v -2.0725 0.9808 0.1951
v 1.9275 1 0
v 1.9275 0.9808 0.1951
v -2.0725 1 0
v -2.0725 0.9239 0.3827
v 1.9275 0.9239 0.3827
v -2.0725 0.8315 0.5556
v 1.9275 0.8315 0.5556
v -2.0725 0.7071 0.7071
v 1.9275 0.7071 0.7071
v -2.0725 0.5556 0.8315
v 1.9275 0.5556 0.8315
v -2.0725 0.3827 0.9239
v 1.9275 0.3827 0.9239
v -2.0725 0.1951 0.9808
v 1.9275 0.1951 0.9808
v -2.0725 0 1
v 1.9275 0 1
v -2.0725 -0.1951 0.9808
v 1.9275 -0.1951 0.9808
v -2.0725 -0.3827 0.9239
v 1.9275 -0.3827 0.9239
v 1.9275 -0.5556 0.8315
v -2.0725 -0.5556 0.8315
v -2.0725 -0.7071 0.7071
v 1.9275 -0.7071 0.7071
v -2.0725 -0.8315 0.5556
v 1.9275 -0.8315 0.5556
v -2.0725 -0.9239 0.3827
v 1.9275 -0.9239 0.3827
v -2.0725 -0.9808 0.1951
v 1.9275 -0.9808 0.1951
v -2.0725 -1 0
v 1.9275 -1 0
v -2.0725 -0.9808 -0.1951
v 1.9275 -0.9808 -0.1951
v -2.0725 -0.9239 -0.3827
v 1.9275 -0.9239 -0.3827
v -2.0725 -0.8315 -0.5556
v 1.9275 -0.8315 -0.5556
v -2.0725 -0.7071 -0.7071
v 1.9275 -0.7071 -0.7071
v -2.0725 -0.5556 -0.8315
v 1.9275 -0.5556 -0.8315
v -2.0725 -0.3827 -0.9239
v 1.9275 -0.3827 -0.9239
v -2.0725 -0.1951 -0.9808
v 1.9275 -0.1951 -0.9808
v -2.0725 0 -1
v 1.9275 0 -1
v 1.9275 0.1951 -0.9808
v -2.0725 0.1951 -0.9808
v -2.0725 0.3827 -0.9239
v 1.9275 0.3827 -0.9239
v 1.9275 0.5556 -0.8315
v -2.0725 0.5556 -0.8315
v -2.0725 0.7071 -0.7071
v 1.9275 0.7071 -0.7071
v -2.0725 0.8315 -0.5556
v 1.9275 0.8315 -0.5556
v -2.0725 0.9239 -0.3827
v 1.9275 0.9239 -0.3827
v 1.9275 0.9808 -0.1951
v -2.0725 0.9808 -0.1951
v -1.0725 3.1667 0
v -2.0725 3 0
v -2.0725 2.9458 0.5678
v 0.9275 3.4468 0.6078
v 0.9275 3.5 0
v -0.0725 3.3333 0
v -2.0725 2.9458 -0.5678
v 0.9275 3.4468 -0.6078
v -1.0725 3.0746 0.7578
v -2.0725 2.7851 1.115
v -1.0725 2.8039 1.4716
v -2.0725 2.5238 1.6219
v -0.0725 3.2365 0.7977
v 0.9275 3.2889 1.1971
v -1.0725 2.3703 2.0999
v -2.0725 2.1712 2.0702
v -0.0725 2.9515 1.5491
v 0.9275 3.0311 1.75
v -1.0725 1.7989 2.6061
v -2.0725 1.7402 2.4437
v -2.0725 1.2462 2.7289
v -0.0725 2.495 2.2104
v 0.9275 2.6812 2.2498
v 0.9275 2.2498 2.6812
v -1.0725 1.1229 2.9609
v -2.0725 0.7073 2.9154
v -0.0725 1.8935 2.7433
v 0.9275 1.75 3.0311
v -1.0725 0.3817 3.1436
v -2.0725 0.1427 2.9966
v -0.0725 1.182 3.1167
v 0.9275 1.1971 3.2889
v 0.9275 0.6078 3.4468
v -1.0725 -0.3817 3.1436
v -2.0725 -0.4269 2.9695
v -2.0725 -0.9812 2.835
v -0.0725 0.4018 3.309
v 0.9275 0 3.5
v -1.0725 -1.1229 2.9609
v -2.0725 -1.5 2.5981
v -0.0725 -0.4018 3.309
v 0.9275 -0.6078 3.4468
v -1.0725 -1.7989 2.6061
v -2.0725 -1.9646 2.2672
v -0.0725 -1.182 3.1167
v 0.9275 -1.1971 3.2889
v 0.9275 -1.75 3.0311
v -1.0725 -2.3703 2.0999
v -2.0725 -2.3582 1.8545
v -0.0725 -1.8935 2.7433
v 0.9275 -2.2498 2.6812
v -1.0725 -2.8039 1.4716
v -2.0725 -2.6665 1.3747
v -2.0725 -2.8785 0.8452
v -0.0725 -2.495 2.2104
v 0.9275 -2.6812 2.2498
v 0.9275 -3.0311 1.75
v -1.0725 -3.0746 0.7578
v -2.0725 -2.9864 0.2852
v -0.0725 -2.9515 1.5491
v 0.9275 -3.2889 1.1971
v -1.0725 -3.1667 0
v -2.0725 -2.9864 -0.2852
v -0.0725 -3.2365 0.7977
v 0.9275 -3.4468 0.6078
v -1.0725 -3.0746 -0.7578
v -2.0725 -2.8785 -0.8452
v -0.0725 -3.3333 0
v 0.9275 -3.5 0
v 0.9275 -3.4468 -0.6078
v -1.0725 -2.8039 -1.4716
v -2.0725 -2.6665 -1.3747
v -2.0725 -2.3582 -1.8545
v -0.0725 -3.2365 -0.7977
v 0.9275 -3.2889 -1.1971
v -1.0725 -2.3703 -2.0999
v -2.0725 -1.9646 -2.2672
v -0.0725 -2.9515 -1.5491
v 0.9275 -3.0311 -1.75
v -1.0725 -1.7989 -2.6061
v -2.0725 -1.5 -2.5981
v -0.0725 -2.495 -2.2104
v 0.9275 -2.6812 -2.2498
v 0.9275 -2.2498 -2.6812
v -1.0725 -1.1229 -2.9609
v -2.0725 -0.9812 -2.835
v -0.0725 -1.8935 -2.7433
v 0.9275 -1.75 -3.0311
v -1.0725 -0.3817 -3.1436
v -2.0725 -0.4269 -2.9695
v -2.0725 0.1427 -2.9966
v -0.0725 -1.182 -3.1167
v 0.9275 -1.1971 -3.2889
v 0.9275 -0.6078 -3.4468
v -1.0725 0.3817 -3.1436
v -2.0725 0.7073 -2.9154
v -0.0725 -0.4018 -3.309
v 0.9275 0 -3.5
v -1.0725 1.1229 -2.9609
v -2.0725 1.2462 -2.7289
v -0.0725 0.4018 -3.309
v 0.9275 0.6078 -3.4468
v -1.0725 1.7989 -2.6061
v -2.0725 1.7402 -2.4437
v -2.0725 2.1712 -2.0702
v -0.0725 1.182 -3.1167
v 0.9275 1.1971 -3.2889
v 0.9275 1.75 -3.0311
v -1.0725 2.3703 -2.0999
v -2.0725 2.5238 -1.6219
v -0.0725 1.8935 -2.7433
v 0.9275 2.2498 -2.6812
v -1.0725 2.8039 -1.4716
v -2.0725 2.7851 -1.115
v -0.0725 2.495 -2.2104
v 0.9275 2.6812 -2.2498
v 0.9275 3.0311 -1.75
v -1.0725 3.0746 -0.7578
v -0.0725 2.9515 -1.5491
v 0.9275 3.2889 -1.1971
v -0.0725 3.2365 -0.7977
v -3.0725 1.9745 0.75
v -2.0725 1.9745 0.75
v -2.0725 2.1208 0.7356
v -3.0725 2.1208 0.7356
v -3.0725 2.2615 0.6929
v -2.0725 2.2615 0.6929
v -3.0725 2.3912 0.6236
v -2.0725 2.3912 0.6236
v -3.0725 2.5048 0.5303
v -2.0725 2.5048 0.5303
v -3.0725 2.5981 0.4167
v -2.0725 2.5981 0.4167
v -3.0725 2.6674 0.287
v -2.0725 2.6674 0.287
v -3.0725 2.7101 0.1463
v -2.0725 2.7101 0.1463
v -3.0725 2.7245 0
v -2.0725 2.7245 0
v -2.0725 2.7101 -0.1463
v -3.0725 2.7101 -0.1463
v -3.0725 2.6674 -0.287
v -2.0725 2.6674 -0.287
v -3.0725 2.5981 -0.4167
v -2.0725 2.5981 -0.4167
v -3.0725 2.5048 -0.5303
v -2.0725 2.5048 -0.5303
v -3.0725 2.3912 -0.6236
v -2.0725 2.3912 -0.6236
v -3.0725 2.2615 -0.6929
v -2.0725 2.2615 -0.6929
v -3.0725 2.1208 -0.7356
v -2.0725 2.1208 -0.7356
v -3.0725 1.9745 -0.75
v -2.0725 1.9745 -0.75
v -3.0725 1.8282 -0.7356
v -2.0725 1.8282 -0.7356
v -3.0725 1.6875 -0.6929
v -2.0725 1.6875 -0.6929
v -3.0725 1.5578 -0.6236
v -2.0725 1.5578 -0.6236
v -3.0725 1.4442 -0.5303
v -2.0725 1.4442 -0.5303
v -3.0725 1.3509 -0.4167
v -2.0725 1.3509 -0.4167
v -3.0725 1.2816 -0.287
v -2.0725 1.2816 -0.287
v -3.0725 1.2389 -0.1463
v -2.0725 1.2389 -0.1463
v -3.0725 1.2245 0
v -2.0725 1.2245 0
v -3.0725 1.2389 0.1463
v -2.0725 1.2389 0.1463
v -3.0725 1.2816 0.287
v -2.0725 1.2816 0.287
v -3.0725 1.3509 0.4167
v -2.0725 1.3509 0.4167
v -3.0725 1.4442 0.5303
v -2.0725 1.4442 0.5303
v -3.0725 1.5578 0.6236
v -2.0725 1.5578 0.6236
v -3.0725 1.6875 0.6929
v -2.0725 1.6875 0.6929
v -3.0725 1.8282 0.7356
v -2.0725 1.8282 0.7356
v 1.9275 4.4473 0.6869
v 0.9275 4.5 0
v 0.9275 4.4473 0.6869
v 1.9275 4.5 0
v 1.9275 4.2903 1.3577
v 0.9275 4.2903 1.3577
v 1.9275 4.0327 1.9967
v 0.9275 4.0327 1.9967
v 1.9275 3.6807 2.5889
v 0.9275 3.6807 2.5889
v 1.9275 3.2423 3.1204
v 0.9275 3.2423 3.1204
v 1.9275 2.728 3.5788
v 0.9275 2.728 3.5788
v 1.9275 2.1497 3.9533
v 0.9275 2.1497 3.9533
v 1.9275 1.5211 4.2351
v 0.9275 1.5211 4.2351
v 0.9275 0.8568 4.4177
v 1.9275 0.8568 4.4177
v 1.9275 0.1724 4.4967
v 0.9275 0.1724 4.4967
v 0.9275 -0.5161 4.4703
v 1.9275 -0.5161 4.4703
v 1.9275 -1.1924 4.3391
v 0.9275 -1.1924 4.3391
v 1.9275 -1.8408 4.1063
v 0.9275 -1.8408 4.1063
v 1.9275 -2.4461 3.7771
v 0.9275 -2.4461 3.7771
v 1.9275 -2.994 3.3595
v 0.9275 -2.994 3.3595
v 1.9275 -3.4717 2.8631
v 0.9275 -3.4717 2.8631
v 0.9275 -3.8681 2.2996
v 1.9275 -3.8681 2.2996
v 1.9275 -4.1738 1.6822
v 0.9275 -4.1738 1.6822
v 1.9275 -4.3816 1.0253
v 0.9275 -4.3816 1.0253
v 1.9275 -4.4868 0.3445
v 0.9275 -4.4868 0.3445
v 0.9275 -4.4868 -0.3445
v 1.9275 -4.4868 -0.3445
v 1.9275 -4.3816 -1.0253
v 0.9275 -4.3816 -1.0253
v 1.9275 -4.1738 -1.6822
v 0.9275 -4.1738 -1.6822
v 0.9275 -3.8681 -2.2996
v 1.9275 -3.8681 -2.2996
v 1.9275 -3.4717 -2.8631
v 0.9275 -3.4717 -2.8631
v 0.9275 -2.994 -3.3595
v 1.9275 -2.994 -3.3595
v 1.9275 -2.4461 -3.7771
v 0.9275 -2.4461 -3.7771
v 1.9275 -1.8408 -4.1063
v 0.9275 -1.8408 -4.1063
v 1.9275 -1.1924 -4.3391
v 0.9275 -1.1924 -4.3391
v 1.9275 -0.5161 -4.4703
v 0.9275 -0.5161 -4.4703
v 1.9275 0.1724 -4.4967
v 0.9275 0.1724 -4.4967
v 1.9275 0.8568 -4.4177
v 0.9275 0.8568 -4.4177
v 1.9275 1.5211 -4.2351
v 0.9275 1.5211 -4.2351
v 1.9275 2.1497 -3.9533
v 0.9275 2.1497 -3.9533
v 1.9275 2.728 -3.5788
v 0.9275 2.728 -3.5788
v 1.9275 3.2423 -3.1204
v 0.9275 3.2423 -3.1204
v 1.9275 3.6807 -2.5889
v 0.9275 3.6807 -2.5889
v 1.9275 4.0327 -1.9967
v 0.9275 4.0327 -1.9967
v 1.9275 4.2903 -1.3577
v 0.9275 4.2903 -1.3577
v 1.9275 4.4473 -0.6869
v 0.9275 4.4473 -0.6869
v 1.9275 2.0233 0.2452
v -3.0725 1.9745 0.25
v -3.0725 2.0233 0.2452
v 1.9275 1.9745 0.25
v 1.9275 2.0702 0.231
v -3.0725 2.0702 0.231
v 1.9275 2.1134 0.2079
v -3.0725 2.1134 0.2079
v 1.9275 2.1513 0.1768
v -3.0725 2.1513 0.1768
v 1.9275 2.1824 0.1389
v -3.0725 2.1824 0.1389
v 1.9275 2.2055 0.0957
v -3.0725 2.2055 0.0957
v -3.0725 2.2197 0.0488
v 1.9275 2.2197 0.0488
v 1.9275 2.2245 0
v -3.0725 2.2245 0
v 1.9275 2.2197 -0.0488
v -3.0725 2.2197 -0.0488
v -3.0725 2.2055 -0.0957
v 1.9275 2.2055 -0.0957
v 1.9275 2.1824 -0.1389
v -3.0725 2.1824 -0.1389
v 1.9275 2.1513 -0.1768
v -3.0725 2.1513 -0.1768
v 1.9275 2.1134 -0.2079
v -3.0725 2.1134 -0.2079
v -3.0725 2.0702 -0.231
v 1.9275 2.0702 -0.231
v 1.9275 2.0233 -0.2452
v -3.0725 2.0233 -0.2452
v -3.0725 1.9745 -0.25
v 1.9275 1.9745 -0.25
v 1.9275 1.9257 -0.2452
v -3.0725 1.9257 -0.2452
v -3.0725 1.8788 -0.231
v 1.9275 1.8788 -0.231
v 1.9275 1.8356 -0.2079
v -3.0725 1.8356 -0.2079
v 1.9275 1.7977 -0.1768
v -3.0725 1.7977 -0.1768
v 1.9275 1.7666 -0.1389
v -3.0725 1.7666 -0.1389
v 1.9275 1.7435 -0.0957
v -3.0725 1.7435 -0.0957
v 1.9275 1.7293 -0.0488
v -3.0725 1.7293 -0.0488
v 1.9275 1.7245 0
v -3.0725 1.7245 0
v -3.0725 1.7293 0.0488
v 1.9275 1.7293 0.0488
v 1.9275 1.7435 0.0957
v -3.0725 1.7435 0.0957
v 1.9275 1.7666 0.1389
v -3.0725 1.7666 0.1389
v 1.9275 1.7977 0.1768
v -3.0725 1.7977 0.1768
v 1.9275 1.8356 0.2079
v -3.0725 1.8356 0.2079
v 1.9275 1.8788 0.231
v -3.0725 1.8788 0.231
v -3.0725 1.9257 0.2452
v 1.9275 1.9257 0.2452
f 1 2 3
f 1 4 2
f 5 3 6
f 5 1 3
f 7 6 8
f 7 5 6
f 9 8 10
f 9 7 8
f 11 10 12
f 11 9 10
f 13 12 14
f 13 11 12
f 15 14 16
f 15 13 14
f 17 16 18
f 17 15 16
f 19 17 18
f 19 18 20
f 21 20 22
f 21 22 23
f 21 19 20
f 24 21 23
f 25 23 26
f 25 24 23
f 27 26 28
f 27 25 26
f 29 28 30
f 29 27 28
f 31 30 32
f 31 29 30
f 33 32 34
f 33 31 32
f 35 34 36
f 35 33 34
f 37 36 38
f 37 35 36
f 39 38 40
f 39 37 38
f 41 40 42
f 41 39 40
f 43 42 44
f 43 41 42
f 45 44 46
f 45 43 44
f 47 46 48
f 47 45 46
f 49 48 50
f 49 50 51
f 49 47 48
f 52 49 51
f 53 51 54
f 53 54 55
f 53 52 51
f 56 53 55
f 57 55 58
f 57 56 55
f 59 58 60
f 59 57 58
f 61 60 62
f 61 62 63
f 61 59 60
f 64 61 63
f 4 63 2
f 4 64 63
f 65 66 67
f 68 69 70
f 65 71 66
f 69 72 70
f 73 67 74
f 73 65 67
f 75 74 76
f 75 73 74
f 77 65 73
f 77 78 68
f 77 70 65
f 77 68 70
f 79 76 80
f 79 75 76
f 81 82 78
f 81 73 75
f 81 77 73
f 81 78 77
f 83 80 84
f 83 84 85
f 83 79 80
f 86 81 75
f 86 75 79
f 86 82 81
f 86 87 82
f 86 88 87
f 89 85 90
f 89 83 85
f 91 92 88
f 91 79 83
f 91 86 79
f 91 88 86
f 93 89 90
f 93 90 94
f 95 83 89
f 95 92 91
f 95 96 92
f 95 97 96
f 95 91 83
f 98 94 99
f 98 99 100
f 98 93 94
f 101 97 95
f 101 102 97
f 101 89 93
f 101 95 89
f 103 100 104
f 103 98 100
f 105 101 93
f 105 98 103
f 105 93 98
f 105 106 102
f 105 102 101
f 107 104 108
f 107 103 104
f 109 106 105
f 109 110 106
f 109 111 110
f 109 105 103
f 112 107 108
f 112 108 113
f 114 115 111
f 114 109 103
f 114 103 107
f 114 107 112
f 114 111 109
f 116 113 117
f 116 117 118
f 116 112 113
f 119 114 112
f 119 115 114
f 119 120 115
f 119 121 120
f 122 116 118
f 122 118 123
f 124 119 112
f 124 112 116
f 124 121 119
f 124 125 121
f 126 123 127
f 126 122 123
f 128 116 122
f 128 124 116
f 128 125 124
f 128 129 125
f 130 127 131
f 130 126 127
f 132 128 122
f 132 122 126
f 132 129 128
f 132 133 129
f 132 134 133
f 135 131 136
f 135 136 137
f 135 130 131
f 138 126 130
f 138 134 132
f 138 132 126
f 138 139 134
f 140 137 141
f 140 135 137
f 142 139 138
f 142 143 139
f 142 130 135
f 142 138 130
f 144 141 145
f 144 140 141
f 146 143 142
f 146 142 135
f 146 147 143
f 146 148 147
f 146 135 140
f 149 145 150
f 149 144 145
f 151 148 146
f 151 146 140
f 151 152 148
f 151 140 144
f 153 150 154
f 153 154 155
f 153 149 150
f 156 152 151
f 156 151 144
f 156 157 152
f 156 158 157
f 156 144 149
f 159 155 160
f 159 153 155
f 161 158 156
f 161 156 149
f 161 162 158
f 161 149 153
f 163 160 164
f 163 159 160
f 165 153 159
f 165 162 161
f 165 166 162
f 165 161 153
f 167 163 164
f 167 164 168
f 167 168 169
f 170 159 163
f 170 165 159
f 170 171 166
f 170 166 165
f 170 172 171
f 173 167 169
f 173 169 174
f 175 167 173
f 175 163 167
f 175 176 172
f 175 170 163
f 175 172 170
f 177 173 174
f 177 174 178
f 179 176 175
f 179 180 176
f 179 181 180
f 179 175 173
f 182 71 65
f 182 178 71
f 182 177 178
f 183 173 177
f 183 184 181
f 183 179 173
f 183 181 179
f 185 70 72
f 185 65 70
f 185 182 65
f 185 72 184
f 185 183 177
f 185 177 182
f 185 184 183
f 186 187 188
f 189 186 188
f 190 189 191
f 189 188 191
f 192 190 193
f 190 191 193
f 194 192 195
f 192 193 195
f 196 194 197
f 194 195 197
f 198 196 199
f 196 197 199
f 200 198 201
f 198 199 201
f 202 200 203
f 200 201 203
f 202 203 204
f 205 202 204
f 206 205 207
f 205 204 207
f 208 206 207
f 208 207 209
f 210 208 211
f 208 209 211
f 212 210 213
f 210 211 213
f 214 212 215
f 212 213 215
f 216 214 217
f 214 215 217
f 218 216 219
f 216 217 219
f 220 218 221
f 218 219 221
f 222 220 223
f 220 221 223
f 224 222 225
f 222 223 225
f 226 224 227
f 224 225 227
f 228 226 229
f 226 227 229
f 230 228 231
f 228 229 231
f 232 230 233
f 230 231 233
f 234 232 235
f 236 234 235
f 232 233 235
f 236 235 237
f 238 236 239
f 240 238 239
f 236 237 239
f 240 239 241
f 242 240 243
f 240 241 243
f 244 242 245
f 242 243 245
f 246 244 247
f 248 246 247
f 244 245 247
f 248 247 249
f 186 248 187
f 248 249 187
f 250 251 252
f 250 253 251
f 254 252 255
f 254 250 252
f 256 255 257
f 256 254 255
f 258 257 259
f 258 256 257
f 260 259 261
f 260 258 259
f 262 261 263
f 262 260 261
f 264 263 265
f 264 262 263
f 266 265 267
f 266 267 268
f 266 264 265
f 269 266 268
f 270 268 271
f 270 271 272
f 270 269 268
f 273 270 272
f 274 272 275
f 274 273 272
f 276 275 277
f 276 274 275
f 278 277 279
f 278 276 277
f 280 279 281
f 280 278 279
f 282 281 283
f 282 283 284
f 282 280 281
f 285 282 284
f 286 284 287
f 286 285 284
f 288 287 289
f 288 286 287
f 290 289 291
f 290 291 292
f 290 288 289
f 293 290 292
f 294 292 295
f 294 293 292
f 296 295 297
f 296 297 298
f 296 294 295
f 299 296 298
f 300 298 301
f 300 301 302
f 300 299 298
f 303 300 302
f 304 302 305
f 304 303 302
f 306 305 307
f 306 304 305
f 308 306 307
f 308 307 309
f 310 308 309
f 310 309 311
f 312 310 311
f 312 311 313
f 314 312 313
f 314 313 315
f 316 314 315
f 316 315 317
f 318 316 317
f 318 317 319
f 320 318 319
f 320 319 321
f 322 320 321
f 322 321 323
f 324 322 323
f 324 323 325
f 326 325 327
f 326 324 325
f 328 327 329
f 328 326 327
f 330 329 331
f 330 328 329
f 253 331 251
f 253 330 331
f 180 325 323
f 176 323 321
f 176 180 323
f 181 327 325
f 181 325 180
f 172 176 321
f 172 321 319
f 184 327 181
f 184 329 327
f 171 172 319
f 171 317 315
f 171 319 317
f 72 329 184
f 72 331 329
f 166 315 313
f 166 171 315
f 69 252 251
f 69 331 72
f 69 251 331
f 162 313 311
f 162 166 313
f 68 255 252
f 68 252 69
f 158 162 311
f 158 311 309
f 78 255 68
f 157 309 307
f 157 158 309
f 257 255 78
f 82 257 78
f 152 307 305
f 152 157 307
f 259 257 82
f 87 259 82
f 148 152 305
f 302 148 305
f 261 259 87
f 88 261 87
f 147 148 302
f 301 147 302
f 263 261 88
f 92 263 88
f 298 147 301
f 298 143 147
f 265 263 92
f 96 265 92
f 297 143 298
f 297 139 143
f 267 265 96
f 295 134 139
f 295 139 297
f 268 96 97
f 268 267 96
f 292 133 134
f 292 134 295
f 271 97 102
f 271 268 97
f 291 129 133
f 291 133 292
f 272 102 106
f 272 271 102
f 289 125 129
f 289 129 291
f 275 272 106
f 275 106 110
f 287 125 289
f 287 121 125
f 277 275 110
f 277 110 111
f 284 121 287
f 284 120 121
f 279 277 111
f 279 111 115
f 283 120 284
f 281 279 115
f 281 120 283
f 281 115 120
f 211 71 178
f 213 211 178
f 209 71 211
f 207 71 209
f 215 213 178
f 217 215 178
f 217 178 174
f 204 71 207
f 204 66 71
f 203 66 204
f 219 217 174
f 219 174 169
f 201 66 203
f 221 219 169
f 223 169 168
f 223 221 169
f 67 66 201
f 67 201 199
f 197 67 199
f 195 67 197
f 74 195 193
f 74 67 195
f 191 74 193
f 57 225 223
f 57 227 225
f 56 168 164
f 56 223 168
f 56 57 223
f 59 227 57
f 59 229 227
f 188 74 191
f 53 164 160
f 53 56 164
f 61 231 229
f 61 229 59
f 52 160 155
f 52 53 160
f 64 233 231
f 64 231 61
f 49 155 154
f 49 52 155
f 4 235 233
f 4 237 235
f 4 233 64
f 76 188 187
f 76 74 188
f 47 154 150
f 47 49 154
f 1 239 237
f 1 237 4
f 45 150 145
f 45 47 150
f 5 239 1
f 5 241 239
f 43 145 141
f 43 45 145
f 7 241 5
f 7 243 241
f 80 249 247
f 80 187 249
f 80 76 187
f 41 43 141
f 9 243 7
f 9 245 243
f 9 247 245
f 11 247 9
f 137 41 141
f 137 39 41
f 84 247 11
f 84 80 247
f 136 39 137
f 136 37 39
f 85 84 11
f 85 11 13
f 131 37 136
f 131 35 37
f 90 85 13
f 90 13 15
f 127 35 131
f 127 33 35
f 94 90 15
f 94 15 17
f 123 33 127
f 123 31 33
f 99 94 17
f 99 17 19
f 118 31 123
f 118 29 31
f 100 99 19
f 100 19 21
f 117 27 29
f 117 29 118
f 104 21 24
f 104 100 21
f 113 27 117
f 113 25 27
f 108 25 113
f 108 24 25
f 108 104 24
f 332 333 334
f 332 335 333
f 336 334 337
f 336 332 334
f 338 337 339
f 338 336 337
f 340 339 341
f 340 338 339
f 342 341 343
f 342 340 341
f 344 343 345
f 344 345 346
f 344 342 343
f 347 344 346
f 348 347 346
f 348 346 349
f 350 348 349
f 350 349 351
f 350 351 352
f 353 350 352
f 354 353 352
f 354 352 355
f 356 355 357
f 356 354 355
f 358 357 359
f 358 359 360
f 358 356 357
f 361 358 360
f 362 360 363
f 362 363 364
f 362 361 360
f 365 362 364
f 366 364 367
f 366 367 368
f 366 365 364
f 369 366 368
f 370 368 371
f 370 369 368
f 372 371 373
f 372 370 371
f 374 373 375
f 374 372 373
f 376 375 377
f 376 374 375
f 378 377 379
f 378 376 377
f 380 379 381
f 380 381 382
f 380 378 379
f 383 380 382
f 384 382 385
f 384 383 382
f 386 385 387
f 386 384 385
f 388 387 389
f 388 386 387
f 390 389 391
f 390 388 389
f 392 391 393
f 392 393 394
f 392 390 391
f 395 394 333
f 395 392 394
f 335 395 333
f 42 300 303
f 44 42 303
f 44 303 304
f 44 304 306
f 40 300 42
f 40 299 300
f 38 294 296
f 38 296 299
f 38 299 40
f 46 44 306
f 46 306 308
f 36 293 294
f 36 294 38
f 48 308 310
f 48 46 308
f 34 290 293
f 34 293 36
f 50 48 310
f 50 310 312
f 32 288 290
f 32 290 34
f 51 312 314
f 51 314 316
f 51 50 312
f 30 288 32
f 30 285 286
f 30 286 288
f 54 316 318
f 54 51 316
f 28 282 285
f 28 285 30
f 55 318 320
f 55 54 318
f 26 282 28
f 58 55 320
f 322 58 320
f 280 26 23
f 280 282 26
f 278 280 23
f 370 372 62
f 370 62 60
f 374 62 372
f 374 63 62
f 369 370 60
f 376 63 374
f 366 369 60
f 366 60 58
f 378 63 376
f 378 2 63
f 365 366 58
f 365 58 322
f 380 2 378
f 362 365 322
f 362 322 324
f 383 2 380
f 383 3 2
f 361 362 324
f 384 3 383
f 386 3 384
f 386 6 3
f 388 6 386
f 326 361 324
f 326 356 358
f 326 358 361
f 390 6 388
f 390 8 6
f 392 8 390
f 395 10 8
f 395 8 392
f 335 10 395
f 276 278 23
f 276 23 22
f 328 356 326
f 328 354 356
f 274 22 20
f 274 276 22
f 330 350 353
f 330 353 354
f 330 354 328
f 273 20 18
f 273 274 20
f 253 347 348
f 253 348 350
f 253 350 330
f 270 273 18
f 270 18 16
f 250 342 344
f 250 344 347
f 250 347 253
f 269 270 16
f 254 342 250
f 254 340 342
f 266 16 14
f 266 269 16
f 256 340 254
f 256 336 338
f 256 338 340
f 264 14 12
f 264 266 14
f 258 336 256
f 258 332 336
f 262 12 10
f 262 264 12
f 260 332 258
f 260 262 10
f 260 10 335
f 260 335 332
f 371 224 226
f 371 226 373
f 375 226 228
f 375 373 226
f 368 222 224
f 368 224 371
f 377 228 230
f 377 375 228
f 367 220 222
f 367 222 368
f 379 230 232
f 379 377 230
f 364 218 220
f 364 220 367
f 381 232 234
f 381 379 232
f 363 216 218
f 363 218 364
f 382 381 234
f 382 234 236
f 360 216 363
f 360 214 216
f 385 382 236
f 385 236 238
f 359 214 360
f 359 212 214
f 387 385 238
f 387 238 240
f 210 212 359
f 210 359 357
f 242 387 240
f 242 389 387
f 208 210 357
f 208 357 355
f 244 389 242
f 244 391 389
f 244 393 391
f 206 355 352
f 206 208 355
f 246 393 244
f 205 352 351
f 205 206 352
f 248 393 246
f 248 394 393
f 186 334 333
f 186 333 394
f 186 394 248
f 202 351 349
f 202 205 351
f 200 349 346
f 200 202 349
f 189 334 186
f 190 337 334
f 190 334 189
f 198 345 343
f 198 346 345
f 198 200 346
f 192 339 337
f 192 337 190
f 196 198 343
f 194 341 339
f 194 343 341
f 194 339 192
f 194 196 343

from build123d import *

# Parameters (mm, degrees)
SKETCH3_R           = 0.25
CUT_EXTRUDE1_DEPTH  = 4
SKETCH4_R           = 0.75
SKETCH4_R_2         = 0.25
BOSS_EXTRUDE1_DEPTH = 1


with BuildPart() as part:
    # Sketch1 → Revolve1 (revolve)
    with BuildSketch(Plane.XY):
        Polygon((0.927471423, 4.5), (1.927471423, 4.5), (1.927471423, 1), (-2.072528577, 1), (-2.072528577, 3), (0.927471423, 3.5), align=None)
    revolve(axis=Axis((-11.471189379, 0, 0), (1, 0, 0)))

    # Sketch3 → Cut-Extrude1 (cut)
    with BuildSketch(Plane.ZY.offset(2.072528577)):
        with Locations((0, 1.974515761)):
            Circle(SKETCH3_R)
    extrude(amount=-CUT_EXTRUDE1_DEPTH, mode=Mode.SUBTRACT)

    # Sketch4 → Boss-Extrude1 (add)
    with BuildSketch(Plane.ZY.offset(2.072528577)):
        with Locations((0, 1.974515761)):
            Circle(SKETCH4_R)
        with Locations((0, 1.974515761)):
            Circle(SKETCH4_R_2, mode=Mode.SUBTRACT)
    extrude(amount=BOSS_EXTRUDE1_DEPTH)


solid = part.part
